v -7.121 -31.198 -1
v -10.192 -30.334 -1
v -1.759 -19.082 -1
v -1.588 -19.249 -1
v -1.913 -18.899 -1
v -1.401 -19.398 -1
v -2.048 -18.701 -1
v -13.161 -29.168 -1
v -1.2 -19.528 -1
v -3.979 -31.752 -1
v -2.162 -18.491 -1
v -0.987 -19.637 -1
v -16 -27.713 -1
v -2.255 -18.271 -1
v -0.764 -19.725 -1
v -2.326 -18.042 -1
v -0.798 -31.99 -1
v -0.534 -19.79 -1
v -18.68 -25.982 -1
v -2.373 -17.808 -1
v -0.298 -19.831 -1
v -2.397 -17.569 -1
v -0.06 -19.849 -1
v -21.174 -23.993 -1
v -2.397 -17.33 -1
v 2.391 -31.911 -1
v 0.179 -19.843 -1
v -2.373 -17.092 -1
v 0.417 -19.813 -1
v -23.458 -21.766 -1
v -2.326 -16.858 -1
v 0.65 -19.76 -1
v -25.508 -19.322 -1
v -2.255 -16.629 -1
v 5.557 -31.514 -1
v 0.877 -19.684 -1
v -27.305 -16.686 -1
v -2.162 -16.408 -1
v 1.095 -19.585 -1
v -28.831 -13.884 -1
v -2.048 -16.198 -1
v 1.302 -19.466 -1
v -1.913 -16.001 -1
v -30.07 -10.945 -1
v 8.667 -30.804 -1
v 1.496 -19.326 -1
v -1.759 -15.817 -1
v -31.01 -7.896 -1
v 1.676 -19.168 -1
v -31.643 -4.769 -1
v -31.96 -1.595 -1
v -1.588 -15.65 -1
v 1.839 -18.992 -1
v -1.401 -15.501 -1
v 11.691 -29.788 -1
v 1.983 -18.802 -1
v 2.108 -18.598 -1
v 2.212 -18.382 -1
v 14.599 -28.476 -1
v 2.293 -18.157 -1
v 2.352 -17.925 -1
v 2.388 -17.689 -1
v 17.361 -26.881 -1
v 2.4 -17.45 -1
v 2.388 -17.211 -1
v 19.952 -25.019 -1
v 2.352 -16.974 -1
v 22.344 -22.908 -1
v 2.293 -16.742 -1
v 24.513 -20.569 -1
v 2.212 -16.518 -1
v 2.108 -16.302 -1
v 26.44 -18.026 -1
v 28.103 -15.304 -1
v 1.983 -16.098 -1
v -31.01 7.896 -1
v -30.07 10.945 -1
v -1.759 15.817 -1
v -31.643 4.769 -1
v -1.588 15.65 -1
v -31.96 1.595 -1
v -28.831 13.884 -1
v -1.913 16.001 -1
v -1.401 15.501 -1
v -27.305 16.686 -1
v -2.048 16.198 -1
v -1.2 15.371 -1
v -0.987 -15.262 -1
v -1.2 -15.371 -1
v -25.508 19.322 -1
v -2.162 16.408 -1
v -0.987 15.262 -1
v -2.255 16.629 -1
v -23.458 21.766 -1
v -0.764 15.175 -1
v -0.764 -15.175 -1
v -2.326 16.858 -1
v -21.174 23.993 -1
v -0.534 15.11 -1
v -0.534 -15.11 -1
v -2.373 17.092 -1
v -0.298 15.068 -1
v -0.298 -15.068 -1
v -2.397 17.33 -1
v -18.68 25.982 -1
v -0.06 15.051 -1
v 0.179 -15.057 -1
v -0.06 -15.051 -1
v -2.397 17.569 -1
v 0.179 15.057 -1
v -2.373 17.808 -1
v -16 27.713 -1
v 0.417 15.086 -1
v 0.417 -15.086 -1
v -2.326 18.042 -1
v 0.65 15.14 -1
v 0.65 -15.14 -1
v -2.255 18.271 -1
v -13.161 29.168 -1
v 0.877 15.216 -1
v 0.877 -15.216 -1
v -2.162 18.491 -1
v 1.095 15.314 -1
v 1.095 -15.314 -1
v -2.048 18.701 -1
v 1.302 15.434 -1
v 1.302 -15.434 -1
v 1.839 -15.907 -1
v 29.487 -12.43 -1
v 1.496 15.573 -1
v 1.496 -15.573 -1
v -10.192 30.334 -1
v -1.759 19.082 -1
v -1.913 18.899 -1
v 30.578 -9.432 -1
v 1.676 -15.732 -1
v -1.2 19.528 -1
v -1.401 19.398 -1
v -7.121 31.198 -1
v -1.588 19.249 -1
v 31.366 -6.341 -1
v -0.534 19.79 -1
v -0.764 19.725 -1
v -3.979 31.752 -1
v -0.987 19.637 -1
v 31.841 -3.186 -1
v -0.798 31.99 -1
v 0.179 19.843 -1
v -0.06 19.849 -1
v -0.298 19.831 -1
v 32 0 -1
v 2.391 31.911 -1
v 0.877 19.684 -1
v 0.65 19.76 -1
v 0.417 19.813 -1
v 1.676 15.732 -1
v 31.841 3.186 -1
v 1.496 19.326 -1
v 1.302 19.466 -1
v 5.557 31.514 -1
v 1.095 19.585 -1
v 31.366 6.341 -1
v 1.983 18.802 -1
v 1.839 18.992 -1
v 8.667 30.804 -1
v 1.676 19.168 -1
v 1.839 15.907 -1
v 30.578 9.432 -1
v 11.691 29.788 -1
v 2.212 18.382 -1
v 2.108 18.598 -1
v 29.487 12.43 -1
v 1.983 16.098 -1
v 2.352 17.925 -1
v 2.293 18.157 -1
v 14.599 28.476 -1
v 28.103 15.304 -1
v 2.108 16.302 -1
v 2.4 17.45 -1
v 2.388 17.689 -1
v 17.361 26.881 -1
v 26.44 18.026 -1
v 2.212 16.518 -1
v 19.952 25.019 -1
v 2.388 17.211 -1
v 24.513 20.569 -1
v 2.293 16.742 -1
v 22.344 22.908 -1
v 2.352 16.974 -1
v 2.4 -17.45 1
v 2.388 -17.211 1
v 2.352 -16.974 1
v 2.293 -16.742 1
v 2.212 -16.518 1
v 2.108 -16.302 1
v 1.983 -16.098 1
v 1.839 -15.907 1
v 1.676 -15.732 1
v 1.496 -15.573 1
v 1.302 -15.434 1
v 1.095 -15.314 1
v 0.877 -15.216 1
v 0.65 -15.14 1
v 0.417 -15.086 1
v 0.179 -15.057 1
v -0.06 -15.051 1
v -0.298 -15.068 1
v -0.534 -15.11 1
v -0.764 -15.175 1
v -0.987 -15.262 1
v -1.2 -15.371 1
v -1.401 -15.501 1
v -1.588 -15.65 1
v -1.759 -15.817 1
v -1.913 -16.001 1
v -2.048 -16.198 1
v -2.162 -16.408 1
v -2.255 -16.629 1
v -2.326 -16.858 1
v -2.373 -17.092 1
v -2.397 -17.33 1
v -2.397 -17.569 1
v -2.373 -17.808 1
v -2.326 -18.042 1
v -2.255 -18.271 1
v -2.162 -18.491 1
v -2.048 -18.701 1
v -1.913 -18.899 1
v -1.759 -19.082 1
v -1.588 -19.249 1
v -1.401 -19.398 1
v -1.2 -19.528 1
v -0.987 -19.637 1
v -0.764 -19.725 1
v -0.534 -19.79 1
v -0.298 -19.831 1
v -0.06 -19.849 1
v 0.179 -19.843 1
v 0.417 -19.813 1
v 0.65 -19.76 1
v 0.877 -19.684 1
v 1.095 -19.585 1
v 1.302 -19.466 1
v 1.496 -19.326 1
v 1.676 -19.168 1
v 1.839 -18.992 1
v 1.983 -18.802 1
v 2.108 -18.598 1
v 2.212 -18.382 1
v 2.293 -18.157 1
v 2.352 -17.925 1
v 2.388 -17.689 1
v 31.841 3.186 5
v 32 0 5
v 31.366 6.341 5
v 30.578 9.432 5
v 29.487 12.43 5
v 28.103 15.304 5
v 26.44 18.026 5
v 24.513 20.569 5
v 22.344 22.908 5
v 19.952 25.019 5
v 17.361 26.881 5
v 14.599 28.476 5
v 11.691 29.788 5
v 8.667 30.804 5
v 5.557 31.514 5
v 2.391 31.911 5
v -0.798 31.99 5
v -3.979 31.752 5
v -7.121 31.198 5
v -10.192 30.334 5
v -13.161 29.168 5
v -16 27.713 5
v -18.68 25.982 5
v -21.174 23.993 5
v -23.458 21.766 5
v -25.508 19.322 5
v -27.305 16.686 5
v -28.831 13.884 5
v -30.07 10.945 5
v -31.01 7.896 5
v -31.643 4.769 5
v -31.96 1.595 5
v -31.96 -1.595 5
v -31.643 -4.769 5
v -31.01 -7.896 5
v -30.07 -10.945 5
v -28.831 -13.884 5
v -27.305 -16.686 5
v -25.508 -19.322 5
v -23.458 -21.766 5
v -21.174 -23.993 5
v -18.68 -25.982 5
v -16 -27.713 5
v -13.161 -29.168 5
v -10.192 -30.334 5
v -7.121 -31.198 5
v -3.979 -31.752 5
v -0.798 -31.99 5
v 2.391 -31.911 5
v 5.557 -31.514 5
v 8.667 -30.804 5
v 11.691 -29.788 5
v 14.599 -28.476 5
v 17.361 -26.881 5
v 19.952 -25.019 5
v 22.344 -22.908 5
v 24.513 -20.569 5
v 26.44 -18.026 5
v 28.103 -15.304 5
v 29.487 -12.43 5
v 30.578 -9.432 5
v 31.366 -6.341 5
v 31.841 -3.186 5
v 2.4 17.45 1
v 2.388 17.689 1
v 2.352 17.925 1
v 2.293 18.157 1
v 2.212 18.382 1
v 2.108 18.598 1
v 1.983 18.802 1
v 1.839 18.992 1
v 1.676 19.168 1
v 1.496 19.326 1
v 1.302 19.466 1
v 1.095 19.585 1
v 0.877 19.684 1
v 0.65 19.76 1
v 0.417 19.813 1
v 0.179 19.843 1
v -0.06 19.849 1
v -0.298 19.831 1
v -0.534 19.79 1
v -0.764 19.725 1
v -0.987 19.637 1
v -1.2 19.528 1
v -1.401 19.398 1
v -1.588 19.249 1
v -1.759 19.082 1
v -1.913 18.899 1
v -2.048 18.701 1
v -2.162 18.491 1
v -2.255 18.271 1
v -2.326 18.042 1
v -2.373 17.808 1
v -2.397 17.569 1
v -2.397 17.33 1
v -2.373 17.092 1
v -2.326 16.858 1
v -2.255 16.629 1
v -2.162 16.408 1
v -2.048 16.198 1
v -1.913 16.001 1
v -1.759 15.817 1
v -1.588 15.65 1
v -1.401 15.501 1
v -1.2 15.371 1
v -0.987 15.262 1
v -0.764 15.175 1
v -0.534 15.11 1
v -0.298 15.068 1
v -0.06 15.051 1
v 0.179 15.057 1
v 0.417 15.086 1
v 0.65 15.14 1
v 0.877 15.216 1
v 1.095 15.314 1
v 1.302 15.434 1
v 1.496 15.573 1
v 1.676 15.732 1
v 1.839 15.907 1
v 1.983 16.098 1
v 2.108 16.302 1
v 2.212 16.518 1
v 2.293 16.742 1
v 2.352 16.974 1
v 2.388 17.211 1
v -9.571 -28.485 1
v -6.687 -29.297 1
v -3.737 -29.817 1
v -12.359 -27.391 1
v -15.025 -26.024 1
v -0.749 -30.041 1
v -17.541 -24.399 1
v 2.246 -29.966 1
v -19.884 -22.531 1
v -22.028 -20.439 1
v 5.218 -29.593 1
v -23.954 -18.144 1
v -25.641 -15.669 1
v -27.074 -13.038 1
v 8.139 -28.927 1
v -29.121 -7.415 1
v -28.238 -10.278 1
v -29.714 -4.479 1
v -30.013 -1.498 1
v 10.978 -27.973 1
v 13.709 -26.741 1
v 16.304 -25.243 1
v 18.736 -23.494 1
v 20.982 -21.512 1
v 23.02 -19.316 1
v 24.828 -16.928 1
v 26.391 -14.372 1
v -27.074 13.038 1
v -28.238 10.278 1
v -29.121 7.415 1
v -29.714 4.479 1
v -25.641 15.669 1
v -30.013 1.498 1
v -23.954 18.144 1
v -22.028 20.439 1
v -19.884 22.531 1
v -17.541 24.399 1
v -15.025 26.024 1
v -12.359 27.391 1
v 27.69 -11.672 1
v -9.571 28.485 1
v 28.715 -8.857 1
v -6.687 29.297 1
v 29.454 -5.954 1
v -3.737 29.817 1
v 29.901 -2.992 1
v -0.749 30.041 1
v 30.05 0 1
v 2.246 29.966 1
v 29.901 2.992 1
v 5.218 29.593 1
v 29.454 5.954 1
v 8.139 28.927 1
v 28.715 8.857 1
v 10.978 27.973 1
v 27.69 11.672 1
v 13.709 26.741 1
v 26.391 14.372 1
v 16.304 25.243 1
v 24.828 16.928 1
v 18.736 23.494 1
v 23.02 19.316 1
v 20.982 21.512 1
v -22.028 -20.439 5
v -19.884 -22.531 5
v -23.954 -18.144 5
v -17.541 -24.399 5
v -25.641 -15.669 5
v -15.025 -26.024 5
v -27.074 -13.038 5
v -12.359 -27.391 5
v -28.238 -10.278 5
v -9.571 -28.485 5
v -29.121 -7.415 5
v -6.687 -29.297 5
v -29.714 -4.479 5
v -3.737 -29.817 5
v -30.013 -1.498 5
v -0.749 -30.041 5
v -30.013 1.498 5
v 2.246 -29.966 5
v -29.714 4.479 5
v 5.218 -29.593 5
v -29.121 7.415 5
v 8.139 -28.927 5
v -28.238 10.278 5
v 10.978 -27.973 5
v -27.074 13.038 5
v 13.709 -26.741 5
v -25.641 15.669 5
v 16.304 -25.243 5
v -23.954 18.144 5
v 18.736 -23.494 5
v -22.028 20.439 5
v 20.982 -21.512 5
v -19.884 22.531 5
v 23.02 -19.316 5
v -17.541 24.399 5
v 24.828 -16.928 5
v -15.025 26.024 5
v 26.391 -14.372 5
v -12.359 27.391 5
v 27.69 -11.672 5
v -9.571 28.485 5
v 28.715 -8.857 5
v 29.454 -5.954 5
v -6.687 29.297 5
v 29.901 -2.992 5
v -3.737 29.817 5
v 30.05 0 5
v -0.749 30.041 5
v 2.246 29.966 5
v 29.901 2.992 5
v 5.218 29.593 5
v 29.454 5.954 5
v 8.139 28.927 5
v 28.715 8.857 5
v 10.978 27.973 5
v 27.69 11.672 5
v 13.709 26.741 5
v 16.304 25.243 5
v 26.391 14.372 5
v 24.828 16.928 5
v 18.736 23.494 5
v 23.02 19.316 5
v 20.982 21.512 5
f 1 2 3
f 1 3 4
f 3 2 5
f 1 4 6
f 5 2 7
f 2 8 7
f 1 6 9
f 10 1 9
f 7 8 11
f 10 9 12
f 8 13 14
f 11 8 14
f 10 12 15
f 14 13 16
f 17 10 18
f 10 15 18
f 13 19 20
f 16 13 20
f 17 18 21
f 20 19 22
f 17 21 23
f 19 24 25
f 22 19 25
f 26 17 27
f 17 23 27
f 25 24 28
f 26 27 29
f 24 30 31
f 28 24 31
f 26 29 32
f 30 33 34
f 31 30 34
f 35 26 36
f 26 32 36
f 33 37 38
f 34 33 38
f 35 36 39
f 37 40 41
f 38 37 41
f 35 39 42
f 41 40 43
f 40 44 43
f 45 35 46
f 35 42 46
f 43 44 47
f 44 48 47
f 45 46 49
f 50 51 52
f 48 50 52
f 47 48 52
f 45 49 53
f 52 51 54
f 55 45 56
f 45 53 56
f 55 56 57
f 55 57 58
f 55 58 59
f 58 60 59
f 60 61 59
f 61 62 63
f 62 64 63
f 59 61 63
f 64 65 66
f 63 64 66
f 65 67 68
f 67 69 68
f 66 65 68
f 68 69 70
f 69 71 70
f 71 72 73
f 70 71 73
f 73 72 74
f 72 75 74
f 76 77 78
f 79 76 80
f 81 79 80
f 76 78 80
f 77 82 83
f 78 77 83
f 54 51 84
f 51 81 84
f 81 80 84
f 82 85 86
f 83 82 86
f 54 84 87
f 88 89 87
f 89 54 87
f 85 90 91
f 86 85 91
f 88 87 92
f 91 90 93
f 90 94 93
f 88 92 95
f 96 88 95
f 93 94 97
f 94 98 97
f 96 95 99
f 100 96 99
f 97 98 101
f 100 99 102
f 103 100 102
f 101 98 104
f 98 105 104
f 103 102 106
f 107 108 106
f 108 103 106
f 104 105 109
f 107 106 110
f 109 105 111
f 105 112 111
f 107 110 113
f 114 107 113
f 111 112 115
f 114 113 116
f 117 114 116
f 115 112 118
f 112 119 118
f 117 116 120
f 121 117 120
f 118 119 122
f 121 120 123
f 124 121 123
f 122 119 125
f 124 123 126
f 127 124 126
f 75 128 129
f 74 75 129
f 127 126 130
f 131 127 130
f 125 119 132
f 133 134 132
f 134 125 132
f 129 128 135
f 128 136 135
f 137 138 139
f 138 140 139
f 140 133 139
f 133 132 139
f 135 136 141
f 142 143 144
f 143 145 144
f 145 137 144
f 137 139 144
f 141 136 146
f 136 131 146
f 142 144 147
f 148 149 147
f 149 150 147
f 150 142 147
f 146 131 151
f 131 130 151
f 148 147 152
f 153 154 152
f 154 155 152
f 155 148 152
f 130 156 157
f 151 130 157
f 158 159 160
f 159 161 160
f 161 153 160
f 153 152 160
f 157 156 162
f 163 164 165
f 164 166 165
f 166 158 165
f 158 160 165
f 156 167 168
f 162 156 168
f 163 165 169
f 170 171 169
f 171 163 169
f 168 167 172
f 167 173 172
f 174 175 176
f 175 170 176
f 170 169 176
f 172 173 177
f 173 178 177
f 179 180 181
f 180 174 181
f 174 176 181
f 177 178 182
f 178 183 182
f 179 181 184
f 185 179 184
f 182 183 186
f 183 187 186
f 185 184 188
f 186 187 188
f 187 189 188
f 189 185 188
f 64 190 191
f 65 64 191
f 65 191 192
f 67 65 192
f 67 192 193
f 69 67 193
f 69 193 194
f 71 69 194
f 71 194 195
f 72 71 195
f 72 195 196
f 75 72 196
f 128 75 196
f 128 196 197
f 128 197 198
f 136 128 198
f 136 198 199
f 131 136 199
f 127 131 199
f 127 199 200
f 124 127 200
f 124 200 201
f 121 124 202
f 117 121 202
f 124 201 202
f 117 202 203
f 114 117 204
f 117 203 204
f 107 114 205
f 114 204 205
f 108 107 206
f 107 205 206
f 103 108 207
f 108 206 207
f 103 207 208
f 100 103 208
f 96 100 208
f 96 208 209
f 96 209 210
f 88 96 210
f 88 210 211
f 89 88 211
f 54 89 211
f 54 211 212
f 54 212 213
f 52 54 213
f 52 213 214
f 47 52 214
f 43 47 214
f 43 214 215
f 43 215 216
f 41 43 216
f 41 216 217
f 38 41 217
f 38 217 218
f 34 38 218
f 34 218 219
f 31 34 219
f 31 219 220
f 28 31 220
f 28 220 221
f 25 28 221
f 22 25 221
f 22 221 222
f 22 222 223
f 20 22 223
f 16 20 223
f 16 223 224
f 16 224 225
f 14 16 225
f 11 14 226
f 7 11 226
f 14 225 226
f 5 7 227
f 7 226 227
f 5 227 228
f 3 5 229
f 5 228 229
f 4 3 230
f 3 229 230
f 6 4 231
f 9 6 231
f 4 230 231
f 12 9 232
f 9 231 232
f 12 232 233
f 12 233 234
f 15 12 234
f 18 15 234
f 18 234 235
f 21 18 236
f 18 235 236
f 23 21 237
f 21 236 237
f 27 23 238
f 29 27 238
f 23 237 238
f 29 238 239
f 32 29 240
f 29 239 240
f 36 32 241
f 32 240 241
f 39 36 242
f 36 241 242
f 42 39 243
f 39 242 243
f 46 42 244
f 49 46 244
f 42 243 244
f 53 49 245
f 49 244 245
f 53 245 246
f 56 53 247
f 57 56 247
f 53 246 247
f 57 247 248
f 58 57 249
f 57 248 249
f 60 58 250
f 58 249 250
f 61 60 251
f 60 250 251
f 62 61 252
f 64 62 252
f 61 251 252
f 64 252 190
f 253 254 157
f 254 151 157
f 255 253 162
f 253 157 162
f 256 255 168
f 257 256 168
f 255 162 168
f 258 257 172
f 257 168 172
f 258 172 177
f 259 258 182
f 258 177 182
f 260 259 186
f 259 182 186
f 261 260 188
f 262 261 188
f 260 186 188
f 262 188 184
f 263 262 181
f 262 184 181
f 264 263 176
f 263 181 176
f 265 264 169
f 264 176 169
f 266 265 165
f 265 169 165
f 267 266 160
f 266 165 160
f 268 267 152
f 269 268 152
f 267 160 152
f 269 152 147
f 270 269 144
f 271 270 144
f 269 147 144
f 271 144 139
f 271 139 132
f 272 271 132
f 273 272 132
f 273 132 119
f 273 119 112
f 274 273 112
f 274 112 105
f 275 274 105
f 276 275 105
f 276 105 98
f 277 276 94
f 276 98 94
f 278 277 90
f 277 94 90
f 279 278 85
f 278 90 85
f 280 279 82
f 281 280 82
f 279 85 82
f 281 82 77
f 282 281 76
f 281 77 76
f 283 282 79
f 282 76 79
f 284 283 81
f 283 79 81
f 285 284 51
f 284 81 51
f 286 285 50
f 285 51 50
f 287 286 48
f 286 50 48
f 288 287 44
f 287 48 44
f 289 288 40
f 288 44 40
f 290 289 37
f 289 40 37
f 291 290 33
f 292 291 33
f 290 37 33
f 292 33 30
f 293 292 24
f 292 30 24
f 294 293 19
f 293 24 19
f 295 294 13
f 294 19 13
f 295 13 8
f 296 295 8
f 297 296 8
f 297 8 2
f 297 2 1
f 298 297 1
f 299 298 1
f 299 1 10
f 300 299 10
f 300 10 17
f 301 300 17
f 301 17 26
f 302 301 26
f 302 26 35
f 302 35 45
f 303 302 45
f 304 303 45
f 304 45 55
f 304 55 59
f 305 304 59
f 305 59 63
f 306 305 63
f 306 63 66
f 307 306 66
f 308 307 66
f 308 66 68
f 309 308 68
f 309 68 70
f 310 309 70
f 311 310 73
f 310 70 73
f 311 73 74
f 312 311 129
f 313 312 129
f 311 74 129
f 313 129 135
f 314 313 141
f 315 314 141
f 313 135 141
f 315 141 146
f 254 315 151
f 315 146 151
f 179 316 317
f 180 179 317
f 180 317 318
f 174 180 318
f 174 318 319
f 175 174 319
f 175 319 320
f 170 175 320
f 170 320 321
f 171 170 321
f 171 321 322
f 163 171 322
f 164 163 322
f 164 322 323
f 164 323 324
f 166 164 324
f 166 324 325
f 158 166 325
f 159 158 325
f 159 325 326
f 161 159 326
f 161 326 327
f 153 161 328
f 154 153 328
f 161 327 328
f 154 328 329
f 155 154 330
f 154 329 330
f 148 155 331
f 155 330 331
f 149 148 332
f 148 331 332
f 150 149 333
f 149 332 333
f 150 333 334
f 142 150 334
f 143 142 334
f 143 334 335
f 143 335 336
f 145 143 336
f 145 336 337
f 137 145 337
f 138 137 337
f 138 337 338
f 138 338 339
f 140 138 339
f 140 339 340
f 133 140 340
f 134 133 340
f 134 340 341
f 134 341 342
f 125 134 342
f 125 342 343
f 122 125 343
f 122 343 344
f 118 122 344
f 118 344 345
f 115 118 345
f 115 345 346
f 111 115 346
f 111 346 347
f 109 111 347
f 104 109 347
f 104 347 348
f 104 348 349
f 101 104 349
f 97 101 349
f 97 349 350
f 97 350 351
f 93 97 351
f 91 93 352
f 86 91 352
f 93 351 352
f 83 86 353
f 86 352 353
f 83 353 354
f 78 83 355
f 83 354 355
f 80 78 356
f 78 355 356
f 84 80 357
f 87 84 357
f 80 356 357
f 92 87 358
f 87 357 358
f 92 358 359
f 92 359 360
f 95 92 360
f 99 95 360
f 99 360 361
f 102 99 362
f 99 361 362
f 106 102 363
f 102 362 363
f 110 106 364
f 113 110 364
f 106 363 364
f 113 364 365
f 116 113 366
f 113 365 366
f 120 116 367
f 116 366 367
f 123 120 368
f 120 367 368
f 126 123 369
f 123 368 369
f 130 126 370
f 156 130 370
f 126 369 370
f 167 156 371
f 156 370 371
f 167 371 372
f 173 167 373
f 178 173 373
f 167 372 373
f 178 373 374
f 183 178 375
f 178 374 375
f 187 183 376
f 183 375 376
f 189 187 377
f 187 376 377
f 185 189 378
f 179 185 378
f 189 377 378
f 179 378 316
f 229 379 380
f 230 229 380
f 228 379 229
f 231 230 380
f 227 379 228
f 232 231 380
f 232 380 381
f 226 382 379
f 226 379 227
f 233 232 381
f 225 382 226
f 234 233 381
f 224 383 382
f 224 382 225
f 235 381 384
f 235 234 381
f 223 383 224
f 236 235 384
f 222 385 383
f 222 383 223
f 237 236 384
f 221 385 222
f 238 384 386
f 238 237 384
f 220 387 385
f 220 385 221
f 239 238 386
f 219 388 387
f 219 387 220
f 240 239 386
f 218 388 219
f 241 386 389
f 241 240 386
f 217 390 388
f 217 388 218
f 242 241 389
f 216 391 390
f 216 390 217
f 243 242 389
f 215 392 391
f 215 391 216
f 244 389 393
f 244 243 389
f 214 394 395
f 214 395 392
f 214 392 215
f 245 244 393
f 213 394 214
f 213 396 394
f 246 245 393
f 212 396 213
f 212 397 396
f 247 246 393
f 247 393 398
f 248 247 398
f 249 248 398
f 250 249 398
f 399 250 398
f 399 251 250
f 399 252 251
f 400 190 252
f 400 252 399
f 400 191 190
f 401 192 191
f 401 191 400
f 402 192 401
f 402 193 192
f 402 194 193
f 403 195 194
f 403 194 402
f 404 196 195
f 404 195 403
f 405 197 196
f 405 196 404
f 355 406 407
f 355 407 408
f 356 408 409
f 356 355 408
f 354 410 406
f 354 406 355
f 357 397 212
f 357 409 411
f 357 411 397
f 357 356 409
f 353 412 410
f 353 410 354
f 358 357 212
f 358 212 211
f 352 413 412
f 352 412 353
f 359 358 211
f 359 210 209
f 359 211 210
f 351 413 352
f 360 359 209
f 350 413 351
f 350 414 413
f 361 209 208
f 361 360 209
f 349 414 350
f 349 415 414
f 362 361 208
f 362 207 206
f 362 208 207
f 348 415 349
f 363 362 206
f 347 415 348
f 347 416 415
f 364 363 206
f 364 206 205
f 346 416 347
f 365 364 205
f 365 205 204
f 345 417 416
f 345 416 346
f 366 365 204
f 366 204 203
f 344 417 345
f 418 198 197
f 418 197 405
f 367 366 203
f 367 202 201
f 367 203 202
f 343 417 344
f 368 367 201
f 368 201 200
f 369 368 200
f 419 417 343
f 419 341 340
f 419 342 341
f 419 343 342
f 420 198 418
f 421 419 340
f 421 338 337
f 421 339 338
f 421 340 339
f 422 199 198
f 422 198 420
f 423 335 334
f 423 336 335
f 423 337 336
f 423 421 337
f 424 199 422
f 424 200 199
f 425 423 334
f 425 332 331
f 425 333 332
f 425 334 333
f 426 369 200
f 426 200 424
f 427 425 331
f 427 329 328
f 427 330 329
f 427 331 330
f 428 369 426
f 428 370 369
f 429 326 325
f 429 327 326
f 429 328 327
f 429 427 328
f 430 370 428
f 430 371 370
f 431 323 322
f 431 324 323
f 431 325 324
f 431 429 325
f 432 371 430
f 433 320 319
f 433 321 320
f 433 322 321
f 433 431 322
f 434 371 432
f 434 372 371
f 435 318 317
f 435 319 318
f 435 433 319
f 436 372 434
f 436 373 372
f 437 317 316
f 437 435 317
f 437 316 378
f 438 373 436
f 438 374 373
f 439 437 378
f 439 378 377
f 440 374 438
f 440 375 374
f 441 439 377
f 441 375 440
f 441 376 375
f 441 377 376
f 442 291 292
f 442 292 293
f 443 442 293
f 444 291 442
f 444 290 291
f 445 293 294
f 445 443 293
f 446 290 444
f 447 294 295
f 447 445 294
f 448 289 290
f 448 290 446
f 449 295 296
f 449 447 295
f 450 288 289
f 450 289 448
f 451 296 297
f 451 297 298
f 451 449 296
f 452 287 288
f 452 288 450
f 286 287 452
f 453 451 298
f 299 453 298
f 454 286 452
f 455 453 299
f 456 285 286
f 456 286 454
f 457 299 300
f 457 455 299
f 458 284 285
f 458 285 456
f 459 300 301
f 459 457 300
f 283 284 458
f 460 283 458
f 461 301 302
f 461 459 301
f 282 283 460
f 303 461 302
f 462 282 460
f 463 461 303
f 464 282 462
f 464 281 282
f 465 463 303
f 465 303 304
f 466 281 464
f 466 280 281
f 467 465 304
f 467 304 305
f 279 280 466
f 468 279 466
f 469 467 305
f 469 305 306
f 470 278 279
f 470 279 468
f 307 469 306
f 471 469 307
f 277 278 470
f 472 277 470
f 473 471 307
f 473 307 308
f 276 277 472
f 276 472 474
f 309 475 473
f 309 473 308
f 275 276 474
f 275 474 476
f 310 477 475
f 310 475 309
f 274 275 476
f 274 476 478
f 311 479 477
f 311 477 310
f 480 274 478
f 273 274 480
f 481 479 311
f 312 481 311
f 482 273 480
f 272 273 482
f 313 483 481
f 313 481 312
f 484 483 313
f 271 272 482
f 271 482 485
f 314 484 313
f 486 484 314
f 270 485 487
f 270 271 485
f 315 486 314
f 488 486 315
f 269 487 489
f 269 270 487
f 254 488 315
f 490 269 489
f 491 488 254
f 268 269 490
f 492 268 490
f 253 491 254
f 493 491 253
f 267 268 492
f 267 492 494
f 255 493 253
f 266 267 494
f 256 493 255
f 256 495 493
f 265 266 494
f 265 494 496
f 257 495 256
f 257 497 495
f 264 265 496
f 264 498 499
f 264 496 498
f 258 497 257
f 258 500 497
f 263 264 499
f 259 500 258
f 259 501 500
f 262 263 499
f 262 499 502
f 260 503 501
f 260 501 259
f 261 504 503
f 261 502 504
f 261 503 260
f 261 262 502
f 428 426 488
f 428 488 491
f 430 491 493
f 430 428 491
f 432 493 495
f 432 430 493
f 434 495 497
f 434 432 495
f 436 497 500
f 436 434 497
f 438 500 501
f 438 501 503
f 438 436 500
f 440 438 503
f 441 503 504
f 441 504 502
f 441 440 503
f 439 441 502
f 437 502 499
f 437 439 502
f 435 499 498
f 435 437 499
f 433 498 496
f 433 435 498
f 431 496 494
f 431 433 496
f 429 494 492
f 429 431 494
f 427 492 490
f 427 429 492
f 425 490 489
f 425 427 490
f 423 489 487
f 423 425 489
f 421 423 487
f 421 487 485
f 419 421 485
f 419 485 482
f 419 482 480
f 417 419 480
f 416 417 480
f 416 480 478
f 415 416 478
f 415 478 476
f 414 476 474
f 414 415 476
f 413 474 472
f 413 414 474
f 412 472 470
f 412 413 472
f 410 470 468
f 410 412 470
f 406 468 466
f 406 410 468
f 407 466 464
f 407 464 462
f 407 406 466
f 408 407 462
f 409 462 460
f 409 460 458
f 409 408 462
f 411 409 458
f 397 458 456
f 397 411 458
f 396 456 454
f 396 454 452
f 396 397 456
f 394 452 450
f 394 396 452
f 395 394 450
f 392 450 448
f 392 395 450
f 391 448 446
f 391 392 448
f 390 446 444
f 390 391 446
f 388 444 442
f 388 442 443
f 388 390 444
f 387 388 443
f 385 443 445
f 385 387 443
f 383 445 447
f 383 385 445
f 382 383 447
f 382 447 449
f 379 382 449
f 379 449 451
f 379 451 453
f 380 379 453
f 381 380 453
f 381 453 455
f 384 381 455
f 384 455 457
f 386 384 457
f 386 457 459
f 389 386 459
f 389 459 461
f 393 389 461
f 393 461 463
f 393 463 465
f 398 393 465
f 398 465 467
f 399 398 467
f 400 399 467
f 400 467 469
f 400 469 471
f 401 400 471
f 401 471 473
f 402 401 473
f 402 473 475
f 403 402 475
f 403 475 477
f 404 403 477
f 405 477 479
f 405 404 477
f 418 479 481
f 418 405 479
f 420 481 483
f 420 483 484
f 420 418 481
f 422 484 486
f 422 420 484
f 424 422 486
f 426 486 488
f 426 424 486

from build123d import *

# Parameters (mm, degrees)
SKETCH1_R                = 32
BOSS_EXTRUDE1_DEPTH      = 0.999998
SKETCH2_R                = 32
SKETCH2_R_2              = 30.05
BOSS_EXTRUDE2_DEPTH      = 4
M4_CLEARANCE_HOLE1_D     = 4.8
M4_CLEARANCE_HOLE1_DEPTH = 1.999996


with BuildPart() as part:
    # Sketch1 → Boss-Extrude1 (new body, symmetric)
    with BuildSketch(Plane.XY):
        Circle(SKETCH1_R)
    extrude(amount=BOSS_EXTRUDE1_DEPTH, both=True)

    # Sketch2 → Boss-Extrude2 (add)
    with BuildSketch(Plane.XY.offset(0.999998)):
        Circle(SKETCH2_R)
        Circle(SKETCH2_R_2, mode=Mode.SUBTRACT)
    extrude(amount=BOSS_EXTRUDE2_DEPTH)

    # M4 Clearance Hole1
    with Locations(Plane(origin=(0, 0, -0.999998), x_dir=(-1, 0, 0), z_dir=(0, 0, -1))):
        with Locations((0, 17.4498), (0, -17.4498)):
            Hole(M4_CLEARANCE_HOLE1_D / 2, depth=M4_CLEARANCE_HOLE1_DEPTH)


solid = part.part
